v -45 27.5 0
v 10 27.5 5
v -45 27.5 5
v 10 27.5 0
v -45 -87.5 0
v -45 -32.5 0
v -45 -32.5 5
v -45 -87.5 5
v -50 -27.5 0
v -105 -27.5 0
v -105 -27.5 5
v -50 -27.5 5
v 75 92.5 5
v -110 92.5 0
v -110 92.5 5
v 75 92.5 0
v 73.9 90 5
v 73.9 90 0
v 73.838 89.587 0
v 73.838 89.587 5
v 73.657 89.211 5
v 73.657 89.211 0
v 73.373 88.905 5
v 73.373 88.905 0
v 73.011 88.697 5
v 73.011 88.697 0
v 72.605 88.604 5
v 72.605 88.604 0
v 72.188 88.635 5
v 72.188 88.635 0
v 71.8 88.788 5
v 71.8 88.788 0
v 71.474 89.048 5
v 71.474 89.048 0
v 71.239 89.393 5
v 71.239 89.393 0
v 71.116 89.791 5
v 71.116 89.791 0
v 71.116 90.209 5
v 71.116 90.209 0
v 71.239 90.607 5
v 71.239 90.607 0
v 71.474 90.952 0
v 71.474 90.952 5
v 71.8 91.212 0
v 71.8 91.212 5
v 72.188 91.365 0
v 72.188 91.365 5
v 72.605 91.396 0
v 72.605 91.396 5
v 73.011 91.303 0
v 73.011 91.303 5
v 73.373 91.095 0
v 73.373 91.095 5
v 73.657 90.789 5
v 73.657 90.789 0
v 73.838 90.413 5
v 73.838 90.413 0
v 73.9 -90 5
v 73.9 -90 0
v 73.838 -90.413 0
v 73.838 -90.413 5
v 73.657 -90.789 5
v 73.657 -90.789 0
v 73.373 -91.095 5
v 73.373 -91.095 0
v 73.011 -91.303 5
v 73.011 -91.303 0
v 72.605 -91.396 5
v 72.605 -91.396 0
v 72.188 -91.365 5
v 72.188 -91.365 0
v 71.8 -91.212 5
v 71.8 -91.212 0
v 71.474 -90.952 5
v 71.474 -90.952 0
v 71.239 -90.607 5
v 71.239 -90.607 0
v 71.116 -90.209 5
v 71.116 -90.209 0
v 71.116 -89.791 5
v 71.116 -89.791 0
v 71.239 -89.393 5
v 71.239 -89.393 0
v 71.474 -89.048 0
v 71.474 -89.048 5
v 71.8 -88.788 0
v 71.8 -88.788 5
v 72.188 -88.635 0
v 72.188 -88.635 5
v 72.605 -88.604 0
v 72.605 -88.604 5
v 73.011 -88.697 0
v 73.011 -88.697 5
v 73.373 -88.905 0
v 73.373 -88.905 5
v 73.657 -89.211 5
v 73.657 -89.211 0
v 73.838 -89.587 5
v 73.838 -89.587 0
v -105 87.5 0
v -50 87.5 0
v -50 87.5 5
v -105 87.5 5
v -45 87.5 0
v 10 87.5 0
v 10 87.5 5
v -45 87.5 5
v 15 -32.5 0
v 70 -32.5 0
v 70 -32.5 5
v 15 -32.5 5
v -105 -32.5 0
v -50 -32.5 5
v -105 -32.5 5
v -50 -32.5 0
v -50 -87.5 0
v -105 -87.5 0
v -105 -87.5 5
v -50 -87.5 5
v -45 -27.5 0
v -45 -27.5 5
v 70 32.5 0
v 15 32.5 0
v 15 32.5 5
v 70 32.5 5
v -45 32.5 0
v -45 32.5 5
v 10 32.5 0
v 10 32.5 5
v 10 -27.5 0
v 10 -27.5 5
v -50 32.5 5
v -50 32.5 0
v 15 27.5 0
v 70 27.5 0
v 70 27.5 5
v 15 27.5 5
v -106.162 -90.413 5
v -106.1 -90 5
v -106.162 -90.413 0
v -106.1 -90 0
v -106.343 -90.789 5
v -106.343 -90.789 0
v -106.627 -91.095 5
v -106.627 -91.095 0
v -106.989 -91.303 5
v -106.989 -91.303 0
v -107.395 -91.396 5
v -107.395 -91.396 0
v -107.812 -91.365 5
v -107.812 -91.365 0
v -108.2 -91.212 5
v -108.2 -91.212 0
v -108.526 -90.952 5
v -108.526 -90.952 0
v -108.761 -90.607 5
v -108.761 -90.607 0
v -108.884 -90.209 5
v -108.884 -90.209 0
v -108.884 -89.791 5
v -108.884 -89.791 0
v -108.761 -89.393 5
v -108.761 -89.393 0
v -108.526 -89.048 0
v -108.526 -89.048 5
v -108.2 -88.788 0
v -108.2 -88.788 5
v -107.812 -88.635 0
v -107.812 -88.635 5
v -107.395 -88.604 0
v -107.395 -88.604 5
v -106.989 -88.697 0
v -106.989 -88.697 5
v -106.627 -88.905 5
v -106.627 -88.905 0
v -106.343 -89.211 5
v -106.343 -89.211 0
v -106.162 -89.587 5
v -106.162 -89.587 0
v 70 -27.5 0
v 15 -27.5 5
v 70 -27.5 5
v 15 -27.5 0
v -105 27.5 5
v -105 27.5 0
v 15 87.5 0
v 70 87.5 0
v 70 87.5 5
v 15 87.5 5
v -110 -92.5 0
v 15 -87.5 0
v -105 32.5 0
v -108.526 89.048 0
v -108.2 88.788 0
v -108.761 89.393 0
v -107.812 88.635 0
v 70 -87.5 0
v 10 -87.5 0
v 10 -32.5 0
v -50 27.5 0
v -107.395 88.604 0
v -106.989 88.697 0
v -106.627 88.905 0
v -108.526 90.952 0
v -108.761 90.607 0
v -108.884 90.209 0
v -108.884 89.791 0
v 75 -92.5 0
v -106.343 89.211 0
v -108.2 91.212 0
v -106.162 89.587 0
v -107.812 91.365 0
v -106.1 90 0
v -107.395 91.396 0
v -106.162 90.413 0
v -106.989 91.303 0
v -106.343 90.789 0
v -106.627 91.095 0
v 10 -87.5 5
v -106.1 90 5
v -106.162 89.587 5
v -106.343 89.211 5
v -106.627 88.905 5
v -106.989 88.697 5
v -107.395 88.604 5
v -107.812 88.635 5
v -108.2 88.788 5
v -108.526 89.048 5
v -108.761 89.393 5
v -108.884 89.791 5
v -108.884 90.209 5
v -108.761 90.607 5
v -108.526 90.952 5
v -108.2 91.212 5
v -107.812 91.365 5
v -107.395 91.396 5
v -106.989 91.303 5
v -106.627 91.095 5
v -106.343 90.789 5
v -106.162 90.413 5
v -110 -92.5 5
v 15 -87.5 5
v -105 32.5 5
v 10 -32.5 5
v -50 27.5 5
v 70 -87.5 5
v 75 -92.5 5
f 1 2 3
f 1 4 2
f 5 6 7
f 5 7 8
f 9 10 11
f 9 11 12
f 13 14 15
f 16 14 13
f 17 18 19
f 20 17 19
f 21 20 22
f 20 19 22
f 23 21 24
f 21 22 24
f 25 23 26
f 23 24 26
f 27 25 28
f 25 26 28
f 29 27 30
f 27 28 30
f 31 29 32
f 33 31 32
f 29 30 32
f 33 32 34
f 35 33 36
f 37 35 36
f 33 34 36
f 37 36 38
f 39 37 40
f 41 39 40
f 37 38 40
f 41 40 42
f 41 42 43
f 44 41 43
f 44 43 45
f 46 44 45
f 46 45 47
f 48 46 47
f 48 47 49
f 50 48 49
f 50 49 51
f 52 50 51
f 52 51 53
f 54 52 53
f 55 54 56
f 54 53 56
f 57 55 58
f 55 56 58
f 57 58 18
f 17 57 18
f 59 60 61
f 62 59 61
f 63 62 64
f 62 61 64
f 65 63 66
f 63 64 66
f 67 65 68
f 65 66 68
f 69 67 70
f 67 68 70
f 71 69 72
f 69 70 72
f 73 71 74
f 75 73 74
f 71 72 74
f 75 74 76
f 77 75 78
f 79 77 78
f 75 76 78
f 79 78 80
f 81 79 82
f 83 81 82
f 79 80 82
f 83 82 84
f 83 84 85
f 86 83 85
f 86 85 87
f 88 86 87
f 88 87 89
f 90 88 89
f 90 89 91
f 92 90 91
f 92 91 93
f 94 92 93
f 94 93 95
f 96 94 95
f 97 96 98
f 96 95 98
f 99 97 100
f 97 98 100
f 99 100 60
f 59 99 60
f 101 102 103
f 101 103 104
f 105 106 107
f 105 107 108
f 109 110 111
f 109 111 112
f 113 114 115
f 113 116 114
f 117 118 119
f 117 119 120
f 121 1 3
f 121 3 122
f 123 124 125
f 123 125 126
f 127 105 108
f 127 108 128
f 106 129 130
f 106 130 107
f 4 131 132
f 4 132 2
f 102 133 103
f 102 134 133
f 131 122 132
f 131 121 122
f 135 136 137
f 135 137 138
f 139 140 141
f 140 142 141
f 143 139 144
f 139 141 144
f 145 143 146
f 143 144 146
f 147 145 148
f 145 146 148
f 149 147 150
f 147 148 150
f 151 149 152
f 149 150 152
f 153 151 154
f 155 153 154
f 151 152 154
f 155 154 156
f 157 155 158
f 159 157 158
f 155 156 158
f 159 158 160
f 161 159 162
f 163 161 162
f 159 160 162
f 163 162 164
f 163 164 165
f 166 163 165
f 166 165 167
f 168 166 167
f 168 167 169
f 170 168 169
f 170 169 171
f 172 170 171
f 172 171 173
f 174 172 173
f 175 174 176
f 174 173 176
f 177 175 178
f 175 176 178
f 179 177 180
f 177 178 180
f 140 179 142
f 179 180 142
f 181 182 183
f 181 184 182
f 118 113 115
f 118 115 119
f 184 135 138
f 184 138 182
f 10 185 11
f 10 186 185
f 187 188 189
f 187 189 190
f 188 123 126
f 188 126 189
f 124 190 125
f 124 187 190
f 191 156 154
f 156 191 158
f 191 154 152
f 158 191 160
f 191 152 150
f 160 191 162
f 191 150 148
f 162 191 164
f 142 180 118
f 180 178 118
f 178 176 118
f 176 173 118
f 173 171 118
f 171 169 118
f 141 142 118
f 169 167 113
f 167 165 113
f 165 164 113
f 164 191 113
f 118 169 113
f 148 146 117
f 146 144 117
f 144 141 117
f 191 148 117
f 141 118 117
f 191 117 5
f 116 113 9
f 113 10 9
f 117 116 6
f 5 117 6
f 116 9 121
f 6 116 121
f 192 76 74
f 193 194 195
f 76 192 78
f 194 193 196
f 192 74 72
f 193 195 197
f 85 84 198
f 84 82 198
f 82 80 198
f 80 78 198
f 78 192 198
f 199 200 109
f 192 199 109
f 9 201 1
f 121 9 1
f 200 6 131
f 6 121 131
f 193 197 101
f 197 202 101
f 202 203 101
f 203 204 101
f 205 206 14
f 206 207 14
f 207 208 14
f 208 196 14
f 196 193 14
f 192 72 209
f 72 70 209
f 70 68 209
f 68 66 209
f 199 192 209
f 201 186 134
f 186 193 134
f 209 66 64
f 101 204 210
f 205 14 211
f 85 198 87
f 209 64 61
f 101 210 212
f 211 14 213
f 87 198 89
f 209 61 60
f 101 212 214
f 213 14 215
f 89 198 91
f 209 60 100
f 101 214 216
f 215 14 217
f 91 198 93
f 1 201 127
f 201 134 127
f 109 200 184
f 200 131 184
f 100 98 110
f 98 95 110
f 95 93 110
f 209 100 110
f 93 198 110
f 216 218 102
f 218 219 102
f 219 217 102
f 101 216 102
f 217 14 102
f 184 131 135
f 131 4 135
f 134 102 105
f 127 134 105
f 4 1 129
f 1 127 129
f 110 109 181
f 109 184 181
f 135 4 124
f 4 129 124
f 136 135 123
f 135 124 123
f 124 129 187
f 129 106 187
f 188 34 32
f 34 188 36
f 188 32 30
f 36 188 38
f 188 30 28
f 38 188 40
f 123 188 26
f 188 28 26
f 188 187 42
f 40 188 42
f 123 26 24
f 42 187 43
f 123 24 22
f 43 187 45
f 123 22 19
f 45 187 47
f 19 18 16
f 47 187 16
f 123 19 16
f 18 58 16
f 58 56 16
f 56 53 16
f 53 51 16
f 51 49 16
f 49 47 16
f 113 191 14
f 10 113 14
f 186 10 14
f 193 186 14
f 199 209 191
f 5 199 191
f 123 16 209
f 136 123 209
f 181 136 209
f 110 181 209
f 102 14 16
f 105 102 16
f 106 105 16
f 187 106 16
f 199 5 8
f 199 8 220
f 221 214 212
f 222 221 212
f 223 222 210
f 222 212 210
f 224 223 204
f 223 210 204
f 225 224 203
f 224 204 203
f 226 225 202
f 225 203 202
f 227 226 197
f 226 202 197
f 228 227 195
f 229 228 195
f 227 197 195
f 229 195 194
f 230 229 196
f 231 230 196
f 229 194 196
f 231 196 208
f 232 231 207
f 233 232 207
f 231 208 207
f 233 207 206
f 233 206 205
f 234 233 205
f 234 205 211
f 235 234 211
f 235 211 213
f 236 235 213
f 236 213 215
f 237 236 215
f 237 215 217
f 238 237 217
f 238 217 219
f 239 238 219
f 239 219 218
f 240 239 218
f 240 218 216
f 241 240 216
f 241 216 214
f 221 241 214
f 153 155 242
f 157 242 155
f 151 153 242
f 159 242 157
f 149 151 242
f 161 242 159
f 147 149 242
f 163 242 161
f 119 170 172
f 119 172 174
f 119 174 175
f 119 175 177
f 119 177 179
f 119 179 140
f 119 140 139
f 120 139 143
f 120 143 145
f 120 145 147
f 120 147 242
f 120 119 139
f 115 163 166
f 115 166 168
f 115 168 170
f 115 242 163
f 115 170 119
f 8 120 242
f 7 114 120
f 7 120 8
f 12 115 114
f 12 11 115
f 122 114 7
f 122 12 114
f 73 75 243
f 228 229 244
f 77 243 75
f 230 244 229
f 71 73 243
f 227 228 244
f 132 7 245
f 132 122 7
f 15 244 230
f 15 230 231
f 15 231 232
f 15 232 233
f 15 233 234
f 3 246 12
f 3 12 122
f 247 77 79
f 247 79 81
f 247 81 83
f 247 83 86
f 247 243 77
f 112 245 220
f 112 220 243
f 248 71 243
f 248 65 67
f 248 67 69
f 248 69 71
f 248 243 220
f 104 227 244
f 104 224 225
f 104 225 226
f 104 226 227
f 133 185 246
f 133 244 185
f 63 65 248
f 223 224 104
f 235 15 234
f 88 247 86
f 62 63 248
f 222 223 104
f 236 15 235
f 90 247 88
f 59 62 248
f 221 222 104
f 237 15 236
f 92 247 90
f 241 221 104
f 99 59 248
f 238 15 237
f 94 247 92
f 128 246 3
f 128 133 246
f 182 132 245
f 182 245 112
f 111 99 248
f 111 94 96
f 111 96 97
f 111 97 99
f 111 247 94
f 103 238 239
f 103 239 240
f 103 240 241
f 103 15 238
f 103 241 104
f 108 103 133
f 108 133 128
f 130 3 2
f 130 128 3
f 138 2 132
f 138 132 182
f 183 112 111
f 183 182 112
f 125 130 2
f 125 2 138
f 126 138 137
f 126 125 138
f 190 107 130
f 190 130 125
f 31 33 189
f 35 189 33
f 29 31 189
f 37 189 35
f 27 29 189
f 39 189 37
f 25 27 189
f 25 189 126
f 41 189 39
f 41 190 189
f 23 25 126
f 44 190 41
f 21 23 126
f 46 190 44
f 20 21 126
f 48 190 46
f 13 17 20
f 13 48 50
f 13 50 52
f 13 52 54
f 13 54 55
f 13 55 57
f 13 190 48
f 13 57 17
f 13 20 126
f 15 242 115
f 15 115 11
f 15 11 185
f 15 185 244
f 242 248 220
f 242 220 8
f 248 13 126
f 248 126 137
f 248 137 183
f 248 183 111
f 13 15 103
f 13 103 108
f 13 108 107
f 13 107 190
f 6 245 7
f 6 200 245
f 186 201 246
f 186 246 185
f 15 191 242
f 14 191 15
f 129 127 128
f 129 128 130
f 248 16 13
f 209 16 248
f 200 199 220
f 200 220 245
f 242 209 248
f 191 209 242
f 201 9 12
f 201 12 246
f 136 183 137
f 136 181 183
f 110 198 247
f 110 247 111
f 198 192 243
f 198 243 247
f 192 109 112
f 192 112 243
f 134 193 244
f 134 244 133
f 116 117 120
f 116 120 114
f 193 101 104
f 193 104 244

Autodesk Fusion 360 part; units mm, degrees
sketch "Sketch1" plane through (0, 0, 0) normal (0, 0, 1) x (1, 0, 0)
  line L0 (110, -92.5) -> (-110, -92.5)
  line L1 (-110, -92.5) -> (-110, 92.5)
  line L2 (-110, 92.5) -> (110, 92.5)
  line L3 (110, 92.5) -> (110, -92.5)
  line L4 (110, -92.5) -> (-110, 92.5) construction
  line L5 (-110, -92.5) -> (110, 92.5) construction
  line L6 (-110, 92.5) -> (97.5144, 92.5)
  line L7 (-53.7181, -92.5) -> (-110, -92.5)
  line L8 (-110, -92.5) -> (-110, 92.5)
  line L9 (-50, 92.5) -> (-45, 92.5)
  line L10 (-45, 92.5) -> (-45, -92.5)
  line L11 (-45, -92.5) -> (-50, -92.5)
  line L12 (-50, -92.5) -> (-50, 92.5)
  line L13 (10, 92.5) -> (15, 92.5)
  line L14 (15, 92.5) -> (15, -92.5)
  line L15 (15, -92.5) -> (10, -92.5)
  line L16 (10, -92.5) -> (10, 92.5)
  line L17 (70, 92.5) -> (75, 92.5)
  line L18 (75, 92.5) -> (75, -92.5)
  line L19 (75, -92.5) -> (70, -92.5)
  line L20 (70, -92.5) -> (70, 92.5)
  line L21 (75, 42.0875) -> (75, 63.0682)
  line L22 (-110, 68) -> (-110, 42.0875)
  line L23 (75, -17.4811) -> (75, -23.4712)
  line L24 (-110, -23.4712) -> (-110, -17.4811)
  line L25 (-110, 32.5) -> (75, 32.5)
  line L26 (75, 32.5) -> (75, 27.5)
  line L27 (75, 27.5) -> (-110, 27.5)
  line L28 (-110, 27.5) -> (-110, 32.5)
  line L29 (-110, -27.5) -> (75, -27.5)
  line L30 (75, -27.5) -> (75, -32.5)
  line L31 (75, -32.5) -> (-110, -32.5)
  line L32 (-110, -32.5) -> (-110, -27.5)
  line L33 (-110, -87.5) -> (75, -87.5)
  line L34 (75, -87.5) -> (75, -92.5)
  line L35 (75, -92.5) -> (-110, -92.5)
  line L36 (-110, -92.5) -> (-110, -87.5)
  line L37 (-110, 92.5) -> (75, 92.5)
  line L38 (75, 92.5) -> (75, 87.5)
  line L39 (75, 87.5) -> (-110, 87.5)
  line L40 (-110, 87.5) -> (-110, 92.5)
  line L41 (-110, 92.5) -> (-105, 92.5)
  line L42 (-105, 92.5) -> (-105, -92.5)
  line L43 (-105, -92.5) -> (-110, -92.5)
  line L44 (-110, -92.5) -> (-110, 92.5)
  line L45 (75, 37.5) -> (110, 37.5) construction
  line L46 (75, -37.5) -> (110, -37.5) construction
  circle A0 centre (76.8705, -4.3263) radius 25 construction
  circle A1 centre (78.6242, -22.2407) radius 1.75
  circle A2 centre (76.6017, 13.6717) radius 1.75
  line L47 (75, 25.3235) -> (110, 25.3235) construction
  dimension "d3" = 220
  dimension "d5" = 5
  dimension "d6" = 5
  dimension "d8" = 5
  dimension "d10" = 55
  dimension "d11" = 55
  dimension "d13" = 5
  dimension "d16" = 5
  dimension "d17" = 5
  dimension "d18" = 5
  dimension "d19" = 55
  dimension "d20" = 55
  dimension "d22" = 55
  dimension "d23" = 5
  dimension "d24" = 55
  dimension "d25" = 55
  dimension "d26" = 55
  dimension "d27" = 50
  dimension "d32" = 3.5
  dimension "d33" = 3.5
  dimension "d34" = 18
  dimension "d35" = 18
extrude "Extrude7" add sketch "Sketch1" along normal blind 5 contours L0 L18 L19 L20 L33 L34 L35 | L0 L14 L20 L33 L35 | L18 L20 L31 L33 | L0 L14 L15 L16 L33 L35 | L18 L20 L29 L30 L31 | L2 L6 L17 L18 L20 L37 L38 L39 | L0 L10 L16 L33 L35 | L14 L16 L31 L33 | L14 L20 L29 L31 | L18 L20 L23 L27 L29 A2 | L2 L6 L14 L20 L37 L39 | L18 L20 L21 L25 L39 | L0 L10 L11 L12 L33 L35 | L14 L16 L29 L31 | L2 L6 L13 L14 L16 L37 L39 | L0 L7 L12 L33 L35 L42 | L10 L12 L31 L33 | L10 L16 L29 L31 | L14 L16 L27 L29 | L14 L20 L25 L27 | L18 L20 L25 L26 L27 | L2 L6 L10 L16 L37 L39 | L14 L16 L25 L39 | L10 L12 L29 L31 | L14 L16 L25 L27 | L18 A2 | L2 L6 L9 L10 L12 L37 L39 | L0 L1 L7 L8 L33 L35 L36 L42 L43 L44 | L12 L29 L31 L42 | L1 L8 L31 L33 L42 L44 | L10 L12 L27 L29 | L10 L16 L25 L27 | L2 L6 L12 L37 L39 L42 | L10 L12 L25 L39 | L1 L8 L29 L31 L32 L42 L44 | L10 L12 L25 L27 | L1 L2 L6 L8 L37 L39 L40 L41 L42 L44 | L12 L25 L27 L42 | L1 L8 L24 L27 L29 L42 L44 | L1 L8 L22 L25 L39 L42 L44 | L1 L8 L25 L27 L28 L42 L44 picked at (74.9727, 13.8309)
sketch "Sketch5" plane through (0, 0, 0) normal (0, 0, 1) x (1, 0, 0)
  line L0 (-110, 92.5) -> (-105, 87.5) construction
  line L1 (-105, 92.5) -> (-110, 87.5) construction
  circle A0 centre (-107.5, 90) radius 1.4
  line L2 (70, 92.5) -> (75, 87.5) construction
  line L3 (75, 92.5) -> (70, 87.5) construction
  circle A1 centre (72.5, 90) radius 1.4
  line L4 (70, -87.5) -> (75, -92.5) construction
  line L5 (75, -87.5) -> (70, -92.5) construction
  circle A2 centre (72.5, -90) radius 1.4
  line L6 (-110, -87.5) -> (-105, -92.5) construction
  line L7 (-105, -87.5) -> (-110, -92.5) construction
  circle A3 centre (-107.5, -90) radius 1.4
  dimension "d54" = 2.8
  dimension "d55" = 2.8
  dimension "d56" = 2.8
  dimension "d57" = 2.8
extrude "Extrude8" cut sketch "Sketch5" along normal through all
equation "Board_piece_lenght = 40 mm"
equation "d5 = Wall_width"
equation "d6 = Wall_width"
equation "Wall_width = 5 mm"
equation "d8 = Wall_width"
equation "d10 = Inner_sqauare"
equation "d11 = Inner_sqauare"
equation "Inner_sqauare = 55 mm"
equation "d13 = Wall_width"
equation "d16 = Wall_width"
equation "d17 = Wall_width"
equation "d18 = Wall_width"
equation "d19 = Inner_sqauare"
equation "d20 = Inner_sqauare"
equation "d22 = Inner_sqauare"
equation "d23 = Wall_width"
equation "d24 = Inner_sqauare"
equation "d25 = Inner_sqauare"
equation "d26 = Inner_sqauare"
